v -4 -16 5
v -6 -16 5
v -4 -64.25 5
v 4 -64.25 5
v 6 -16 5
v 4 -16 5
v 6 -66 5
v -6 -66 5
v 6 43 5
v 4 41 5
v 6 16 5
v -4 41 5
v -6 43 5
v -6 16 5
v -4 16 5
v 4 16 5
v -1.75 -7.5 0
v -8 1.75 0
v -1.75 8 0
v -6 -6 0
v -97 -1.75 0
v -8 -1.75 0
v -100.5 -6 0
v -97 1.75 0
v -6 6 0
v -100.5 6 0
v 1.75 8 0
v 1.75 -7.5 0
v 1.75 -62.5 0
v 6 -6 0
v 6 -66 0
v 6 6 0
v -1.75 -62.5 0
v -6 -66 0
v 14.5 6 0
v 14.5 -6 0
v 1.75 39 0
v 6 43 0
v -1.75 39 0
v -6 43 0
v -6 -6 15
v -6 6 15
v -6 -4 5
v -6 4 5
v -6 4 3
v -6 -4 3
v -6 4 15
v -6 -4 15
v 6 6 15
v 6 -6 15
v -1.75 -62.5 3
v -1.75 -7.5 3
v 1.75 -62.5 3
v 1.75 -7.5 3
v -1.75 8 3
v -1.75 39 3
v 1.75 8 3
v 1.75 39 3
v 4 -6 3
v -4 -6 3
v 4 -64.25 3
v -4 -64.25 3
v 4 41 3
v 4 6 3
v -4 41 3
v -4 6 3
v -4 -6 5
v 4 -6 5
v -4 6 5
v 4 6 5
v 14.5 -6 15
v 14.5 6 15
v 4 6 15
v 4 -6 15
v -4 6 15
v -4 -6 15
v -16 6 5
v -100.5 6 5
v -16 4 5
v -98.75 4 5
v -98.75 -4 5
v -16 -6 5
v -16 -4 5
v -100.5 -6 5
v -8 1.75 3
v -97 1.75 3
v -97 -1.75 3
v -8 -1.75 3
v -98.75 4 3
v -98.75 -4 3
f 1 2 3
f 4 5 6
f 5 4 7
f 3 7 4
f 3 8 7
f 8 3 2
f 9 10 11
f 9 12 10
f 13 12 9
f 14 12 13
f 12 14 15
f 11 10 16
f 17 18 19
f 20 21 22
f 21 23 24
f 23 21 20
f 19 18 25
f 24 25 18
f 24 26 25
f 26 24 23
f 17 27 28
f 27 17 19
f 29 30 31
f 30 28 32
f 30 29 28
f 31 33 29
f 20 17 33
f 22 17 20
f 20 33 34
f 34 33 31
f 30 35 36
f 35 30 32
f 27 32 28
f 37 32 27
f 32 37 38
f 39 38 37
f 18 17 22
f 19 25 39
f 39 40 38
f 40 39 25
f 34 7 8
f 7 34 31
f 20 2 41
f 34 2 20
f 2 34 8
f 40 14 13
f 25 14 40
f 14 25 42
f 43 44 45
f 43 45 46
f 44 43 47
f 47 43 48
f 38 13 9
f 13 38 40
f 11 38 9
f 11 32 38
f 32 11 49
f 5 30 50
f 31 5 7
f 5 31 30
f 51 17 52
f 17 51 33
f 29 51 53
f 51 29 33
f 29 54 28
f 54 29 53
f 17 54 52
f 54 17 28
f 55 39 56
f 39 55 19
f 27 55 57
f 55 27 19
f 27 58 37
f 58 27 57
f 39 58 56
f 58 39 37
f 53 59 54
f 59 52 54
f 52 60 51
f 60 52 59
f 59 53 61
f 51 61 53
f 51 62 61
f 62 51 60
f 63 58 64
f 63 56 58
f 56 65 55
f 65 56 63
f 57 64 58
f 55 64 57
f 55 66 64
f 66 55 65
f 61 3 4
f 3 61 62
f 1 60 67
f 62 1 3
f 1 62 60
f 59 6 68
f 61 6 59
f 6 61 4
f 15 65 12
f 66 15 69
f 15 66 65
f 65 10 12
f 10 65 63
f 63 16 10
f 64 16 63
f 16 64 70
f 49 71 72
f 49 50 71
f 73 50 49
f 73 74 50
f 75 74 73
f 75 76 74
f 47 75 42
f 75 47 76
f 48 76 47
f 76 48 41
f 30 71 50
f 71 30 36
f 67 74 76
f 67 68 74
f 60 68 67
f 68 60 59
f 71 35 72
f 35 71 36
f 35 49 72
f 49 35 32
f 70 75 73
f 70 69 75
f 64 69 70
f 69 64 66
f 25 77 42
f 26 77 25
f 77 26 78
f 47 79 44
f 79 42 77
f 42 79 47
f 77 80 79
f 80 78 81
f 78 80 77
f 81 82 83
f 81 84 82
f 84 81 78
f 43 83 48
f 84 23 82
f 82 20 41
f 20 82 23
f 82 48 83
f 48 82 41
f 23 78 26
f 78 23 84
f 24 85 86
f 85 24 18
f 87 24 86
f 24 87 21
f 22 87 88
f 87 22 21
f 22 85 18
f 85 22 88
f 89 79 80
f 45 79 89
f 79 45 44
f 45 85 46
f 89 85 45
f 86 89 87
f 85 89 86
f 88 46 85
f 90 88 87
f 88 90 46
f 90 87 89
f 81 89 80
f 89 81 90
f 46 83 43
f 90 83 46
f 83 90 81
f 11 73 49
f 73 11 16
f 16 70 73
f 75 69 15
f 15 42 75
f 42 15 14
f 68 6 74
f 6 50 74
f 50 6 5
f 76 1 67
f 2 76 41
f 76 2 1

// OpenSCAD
//Phone Microscope Adapter Body

module triangle_support(){
linear_extrude(height=2)polygon([[0,0],[10,0],[0,10]]);
}

//Body of Adapter
rotate([180,0,0])translate([0,0,-15])union(){

	//Center Connector
		linear_extrude(height=15)translate([-12/2,-6,0])square([20.5,12]);

	//Horizontal arms
		difference(){
			translate([0,0,10])linear_extrude(height=5)difference(){
				translate([-6,-43,0])square([12,109]);
				union(){
					translate([0,-23.5,-.5])square([3.5,31], center=true);
					translate([0,35,-.5])square([3.5,55], center=true);
				}
			}
			translate([0,0,9])linear_extrude(height=3){
				union(){
					translate([0,-23,-.5])square([8,36], center=true);
					translate([0,34.5,-.5])square([8,59.5], center=true);
				}
			}
		}
}

//Horizontal arm triangular supports
	translate([6,6,5])rotate([0,270,0])triangle_support();
	translate([-4,6,5])rotate([0,270,0])triangle_support();
	translate([4,-6,5])rotate([0,270,180])triangle_support();
	translate([-6,-6,5])rotate([0,270,180])triangle_support();

//Vertical arm
	rotate([180,0,0])union(){

	//Vertical arm triangular supports
		translate([-1,-2,-10])rotate([0,0,270]){
			translate([4,-5,5])rotate([0,90,180])triangle_support();
			translate([-6,-5,5])rotate([0,90,180])triangle_support();
		}

	translate([0,0,-15]){
		translate([-1,0,0])rotate([0,0,90])difference(){
			translate([0,0,10])linear_extrude(height=5)difference(){
				translate([-6,4,0])square([12,95.5]);
				translate([0,51.5,-.5])square([3.5,89], center=true);
			}
			translate([0,0,9])linear_extrude(height=3){
				translate([0,46.25,-.5])square([8,103], center=true);
			}
		}
	}

}
